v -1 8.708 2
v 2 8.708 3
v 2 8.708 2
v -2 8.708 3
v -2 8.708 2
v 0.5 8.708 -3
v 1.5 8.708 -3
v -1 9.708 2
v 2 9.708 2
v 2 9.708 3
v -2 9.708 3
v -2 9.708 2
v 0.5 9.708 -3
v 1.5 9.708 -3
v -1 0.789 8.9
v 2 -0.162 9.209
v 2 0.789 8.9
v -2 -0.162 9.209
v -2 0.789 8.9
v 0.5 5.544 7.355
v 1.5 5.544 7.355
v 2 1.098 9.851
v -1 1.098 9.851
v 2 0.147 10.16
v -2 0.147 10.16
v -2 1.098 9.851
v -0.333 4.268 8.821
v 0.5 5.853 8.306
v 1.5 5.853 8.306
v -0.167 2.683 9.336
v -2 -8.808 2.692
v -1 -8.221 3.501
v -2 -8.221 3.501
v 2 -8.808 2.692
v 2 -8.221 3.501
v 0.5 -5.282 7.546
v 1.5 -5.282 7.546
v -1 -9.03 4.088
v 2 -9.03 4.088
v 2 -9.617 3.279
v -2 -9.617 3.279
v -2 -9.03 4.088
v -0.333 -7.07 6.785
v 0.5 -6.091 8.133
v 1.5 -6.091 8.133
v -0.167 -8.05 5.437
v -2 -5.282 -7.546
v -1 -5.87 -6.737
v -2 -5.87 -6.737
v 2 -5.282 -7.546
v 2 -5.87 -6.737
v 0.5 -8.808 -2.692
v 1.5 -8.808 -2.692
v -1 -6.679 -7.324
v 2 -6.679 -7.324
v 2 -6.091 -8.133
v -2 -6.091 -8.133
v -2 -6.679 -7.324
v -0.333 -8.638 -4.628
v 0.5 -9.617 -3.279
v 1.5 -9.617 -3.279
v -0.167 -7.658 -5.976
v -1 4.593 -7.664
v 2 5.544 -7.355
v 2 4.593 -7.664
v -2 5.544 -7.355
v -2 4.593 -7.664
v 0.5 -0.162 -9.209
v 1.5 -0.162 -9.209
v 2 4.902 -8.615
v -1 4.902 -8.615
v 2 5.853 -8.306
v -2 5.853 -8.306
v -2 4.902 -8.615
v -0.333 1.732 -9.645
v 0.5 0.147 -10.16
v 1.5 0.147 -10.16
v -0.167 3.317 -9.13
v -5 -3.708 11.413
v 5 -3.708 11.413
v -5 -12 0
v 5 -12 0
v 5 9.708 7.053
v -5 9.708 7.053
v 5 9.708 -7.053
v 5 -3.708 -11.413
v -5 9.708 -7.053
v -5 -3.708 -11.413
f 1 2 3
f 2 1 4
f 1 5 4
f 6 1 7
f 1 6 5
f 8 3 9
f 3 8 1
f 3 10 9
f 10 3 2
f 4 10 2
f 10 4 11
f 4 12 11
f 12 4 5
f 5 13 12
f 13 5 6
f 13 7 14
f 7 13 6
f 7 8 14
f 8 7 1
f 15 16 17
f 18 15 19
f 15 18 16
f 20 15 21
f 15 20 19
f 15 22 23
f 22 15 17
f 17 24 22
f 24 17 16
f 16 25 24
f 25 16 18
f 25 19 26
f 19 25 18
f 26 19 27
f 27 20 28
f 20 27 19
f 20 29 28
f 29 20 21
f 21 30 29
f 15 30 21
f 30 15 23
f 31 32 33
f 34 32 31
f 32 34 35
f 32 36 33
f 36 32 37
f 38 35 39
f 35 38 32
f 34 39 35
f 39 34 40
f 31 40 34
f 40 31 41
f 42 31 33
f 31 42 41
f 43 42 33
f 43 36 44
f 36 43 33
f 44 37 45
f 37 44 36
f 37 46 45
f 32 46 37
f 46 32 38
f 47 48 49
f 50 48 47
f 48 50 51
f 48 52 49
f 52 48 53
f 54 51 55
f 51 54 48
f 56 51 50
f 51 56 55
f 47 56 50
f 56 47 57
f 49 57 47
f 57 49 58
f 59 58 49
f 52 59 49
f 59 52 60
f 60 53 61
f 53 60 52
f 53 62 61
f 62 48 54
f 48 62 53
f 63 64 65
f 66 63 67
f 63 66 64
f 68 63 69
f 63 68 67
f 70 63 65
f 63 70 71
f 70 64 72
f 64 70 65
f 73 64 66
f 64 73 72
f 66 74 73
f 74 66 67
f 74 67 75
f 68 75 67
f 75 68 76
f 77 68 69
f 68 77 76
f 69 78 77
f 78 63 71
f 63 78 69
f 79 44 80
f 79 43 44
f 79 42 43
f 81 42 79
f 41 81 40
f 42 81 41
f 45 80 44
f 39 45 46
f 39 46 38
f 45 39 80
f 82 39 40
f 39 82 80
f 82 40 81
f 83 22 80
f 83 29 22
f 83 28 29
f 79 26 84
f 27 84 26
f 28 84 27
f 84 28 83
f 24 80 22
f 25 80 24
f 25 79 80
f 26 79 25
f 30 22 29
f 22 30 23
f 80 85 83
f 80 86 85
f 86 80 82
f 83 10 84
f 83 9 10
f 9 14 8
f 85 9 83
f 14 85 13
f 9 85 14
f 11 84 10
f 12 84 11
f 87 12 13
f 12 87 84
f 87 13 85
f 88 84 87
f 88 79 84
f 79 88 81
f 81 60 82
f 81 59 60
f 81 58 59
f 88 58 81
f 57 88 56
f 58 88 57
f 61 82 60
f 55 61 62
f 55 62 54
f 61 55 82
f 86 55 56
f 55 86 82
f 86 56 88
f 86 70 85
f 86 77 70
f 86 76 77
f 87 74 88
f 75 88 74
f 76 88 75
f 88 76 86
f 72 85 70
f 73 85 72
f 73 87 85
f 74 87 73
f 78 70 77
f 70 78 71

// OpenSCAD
// Kinematics-gate fixture (scripts/kinematics-check.sh --selftest): a
// five-faced numeral shell posed at discrete LANDING STOPS, plus the
// reader-frame probes that decide whether the presenting face landed flat and
// whether its numeral reads upright — and the rolled/mirrored controls that
// prove each probe can fail. Units: mm.
//
// Frame: the shell's axis is X. The reader looks along -Y with Z up, so the
// presenting face is the one whose outward normal is +Y; its glyph is drawn
// in reader coordinates (u = reader's right = -X, v = up = +Z). Face k has
// its outward normal at k*360/faces from +Y (toward +Z) in the shell's own
// frame, and the pose that presents face k rolls the shell by -k*360/faces
// about X, so `stop` (an integer the gate steps through) both selects the
// face and poses it.
//
// The gate evaluates `part` at every declared stop and counts facets:
//   landing-flat          posed shell ∩ the slab beyond the landed face plane
//                         (offset by the roll tolerance) — empty when the face
//                         landed within tol_deg of reader-upright
//   landing-flat-in-tol   the same, rolled by HALF the tolerance — still empty,
//                         so the tolerance is a tolerance and not an equality
//   landing-flat-rolled   rolled by roll_err — the empty-control: the top
//                         vertex crosses the slab, so it must show facets
//   landing-glyph         posed numeral cutter ∩ the chiral-stroke probe (a box
//                         only the upright, right-handed numeral covers) —
//                         non-empty when the numeral reads correctly
//   landing-glyph-mirrored  the numeral engraved back-to-front — the
//                         nonempty-control: the stroke is on the other side
//   landing-glyph-rolled  the numeral rolled by roll_err — the second
//                         nonempty-control: the stroke has moved off the probe
//   landing-glyph-cover   upright template (shrunk by cover_tol) − posed cutter
//                         — empty when the posed numeral COVERS the upright
//                         template, the stronger form of the glyph proof
//   landing-glyph-cover-mirrored  the same against the mirrored numeral —
//                         empty-control: the template's stroke is uncovered
//   assembled             the posed shell, for a human to look at (not gated)

/* [Landing stop] */
stop = 0;               // integer stop index; face `stop` presents at this stop (gate-stepped)
part = "assembled";     // which boolean to render (see the header)

/* [Shell] */
faces = 5;              // faces around the axis (a pentagon shell)
R = 12;                 // mm, circumradius of the shell polygon
len = 10;               // mm, axial length of the shell
tol_deg = 3;            // deg, roll tolerance the flat probe allows
roll_err = 20;          // deg, the mis-landing the rolled controls exhibit
glyph_depth = 1;        // mm, the numeral engraving depth
cover_tol = 0.35;       // mm, the upright template is shrunk by this before the cover test

$fn = 24;               // coarse: fixture, never printed

step_deg = 360 / faces;
apothem = R * cos(180 / faces);                    // face-plane distance from the axis
// A landed face rolled by d puts its top vertex at R*cos(180/faces - d) from
// the axis, beyond the face plane; the slab starts where a tol_deg roll would
// put it, so anything within tolerance stays below the probe.
flat_eps = R * (cos(180 / faces - tol_deg) - cos(180 / faces));

// The numeral: a "7" in reader coordinates (u right, v up). Chiral on purpose
// — its stem leans, so a mirrored copy is a different shape and a probe can
// tell them apart.
seven = [[-2, 3], [2, 3], [2, 2], [-0.5, -3], [-1.5, -3], [1, 2], [-2, 2]];

// 2D numeral in the shell's XZ plane: reader u = -X, so the upright numeral
// is the mirror of `seven`; the mirrored numeral is `seven` as drawn.
module numeral2d(mirrored=false) {
    if (mirrored) polygon(seven); else mirror([1, 0]) polygon(seven);
}

// The cutter for face 0 (normal +Y): the numeral extruded from just outside
// the face plane down to glyph_depth into it.
module cutter0(mirrored=false) {
    translate([0, apothem + 0.5, 0]) rotate([90, 0, 0])
        linear_extrude(height=glyph_depth + 0.5) numeral2d(mirrored);
}

// Every face's cutter, in the shell frame.
module cutters(mirrored=false) {
    for (k = [0 : faces - 1]) rotate([k * step_deg, 0, 0]) cutter0(mirrored);
}

// The shell: a `faces`-gon prism along X with one face centred on +Y, the
// numerals engraved into every face.
module shell(mirrored=false) {
    difference() {
        rotate([90, 0, 90]) linear_extrude(height=len, center=true)
            polygon([for (k = [0 : faces - 1])
                let (a = 180 / faces + k * step_deg) [R * cos(a), R * sin(a)]]);
        cutters(mirrored);
    }
}

// Pose that presents face `stop`, plus an optional roll error.
module posed(err=0) {
    rotate([-stop * step_deg + err, 0, 0]) children();
}

// Probes, all in the reader frame on the presenting face.
module flat_probe() {
    translate([-len / 2 - 1, apothem + flat_eps, -R]) cube([len + 2, 5, 2 * R]);
}
// Inside the "7"'s stem near its foot: at v=-1.75 the upright stem spans
// u in [-0.875, 0.125], the mirrored one [-0.125, 0.875], and the rolled-180
// numeral's stem sits at u in [-1.875, -0.875]; the probe at u in [-0.8,-0.3]
// meets only the upright stroke.
module stroke_probe() {
    translate([0.3, apothem - glyph_depth + 0.1, -1.9]) cube([0.5, glyph_depth + 0.2, 0.3]);
}
// The upright numeral shrunk by cover_tol, spanning the engraved depth.
module cover_template() {
    translate([0, apothem - 0.2, 0]) rotate([90, 0, 0])
        linear_extrude(height=glyph_depth - 0.4)
            offset(delta=-cover_tol) numeral2d();
}

if (part == "landing-flat") {
    intersection() { posed() shell(); flat_probe(); }
} else if (part == "landing-flat-in-tol") {
    intersection() { posed(tol_deg / 2) shell(); flat_probe(); }
} else if (part == "landing-flat-rolled") {
    intersection() { posed(roll_err) shell(); flat_probe(); }
} else if (part == "landing-glyph") {
    intersection() { posed() cutters(); stroke_probe(); }
} else if (part == "landing-glyph-mirrored") {
    intersection() { posed() cutters(mirrored=true); stroke_probe(); }
} else if (part == "landing-glyph-rolled") {
    intersection() { posed(roll_err) cutters(); stroke_probe(); }
} else if (part == "landing-glyph-cover") {
    difference() { cover_template(); posed() cutters(); }
} else if (part == "landing-glyph-cover-mirrored") {
    difference() { cover_template(); posed() cutters(mirrored=true); }
} else if (part == "assembled") {
    posed() shell();
}
